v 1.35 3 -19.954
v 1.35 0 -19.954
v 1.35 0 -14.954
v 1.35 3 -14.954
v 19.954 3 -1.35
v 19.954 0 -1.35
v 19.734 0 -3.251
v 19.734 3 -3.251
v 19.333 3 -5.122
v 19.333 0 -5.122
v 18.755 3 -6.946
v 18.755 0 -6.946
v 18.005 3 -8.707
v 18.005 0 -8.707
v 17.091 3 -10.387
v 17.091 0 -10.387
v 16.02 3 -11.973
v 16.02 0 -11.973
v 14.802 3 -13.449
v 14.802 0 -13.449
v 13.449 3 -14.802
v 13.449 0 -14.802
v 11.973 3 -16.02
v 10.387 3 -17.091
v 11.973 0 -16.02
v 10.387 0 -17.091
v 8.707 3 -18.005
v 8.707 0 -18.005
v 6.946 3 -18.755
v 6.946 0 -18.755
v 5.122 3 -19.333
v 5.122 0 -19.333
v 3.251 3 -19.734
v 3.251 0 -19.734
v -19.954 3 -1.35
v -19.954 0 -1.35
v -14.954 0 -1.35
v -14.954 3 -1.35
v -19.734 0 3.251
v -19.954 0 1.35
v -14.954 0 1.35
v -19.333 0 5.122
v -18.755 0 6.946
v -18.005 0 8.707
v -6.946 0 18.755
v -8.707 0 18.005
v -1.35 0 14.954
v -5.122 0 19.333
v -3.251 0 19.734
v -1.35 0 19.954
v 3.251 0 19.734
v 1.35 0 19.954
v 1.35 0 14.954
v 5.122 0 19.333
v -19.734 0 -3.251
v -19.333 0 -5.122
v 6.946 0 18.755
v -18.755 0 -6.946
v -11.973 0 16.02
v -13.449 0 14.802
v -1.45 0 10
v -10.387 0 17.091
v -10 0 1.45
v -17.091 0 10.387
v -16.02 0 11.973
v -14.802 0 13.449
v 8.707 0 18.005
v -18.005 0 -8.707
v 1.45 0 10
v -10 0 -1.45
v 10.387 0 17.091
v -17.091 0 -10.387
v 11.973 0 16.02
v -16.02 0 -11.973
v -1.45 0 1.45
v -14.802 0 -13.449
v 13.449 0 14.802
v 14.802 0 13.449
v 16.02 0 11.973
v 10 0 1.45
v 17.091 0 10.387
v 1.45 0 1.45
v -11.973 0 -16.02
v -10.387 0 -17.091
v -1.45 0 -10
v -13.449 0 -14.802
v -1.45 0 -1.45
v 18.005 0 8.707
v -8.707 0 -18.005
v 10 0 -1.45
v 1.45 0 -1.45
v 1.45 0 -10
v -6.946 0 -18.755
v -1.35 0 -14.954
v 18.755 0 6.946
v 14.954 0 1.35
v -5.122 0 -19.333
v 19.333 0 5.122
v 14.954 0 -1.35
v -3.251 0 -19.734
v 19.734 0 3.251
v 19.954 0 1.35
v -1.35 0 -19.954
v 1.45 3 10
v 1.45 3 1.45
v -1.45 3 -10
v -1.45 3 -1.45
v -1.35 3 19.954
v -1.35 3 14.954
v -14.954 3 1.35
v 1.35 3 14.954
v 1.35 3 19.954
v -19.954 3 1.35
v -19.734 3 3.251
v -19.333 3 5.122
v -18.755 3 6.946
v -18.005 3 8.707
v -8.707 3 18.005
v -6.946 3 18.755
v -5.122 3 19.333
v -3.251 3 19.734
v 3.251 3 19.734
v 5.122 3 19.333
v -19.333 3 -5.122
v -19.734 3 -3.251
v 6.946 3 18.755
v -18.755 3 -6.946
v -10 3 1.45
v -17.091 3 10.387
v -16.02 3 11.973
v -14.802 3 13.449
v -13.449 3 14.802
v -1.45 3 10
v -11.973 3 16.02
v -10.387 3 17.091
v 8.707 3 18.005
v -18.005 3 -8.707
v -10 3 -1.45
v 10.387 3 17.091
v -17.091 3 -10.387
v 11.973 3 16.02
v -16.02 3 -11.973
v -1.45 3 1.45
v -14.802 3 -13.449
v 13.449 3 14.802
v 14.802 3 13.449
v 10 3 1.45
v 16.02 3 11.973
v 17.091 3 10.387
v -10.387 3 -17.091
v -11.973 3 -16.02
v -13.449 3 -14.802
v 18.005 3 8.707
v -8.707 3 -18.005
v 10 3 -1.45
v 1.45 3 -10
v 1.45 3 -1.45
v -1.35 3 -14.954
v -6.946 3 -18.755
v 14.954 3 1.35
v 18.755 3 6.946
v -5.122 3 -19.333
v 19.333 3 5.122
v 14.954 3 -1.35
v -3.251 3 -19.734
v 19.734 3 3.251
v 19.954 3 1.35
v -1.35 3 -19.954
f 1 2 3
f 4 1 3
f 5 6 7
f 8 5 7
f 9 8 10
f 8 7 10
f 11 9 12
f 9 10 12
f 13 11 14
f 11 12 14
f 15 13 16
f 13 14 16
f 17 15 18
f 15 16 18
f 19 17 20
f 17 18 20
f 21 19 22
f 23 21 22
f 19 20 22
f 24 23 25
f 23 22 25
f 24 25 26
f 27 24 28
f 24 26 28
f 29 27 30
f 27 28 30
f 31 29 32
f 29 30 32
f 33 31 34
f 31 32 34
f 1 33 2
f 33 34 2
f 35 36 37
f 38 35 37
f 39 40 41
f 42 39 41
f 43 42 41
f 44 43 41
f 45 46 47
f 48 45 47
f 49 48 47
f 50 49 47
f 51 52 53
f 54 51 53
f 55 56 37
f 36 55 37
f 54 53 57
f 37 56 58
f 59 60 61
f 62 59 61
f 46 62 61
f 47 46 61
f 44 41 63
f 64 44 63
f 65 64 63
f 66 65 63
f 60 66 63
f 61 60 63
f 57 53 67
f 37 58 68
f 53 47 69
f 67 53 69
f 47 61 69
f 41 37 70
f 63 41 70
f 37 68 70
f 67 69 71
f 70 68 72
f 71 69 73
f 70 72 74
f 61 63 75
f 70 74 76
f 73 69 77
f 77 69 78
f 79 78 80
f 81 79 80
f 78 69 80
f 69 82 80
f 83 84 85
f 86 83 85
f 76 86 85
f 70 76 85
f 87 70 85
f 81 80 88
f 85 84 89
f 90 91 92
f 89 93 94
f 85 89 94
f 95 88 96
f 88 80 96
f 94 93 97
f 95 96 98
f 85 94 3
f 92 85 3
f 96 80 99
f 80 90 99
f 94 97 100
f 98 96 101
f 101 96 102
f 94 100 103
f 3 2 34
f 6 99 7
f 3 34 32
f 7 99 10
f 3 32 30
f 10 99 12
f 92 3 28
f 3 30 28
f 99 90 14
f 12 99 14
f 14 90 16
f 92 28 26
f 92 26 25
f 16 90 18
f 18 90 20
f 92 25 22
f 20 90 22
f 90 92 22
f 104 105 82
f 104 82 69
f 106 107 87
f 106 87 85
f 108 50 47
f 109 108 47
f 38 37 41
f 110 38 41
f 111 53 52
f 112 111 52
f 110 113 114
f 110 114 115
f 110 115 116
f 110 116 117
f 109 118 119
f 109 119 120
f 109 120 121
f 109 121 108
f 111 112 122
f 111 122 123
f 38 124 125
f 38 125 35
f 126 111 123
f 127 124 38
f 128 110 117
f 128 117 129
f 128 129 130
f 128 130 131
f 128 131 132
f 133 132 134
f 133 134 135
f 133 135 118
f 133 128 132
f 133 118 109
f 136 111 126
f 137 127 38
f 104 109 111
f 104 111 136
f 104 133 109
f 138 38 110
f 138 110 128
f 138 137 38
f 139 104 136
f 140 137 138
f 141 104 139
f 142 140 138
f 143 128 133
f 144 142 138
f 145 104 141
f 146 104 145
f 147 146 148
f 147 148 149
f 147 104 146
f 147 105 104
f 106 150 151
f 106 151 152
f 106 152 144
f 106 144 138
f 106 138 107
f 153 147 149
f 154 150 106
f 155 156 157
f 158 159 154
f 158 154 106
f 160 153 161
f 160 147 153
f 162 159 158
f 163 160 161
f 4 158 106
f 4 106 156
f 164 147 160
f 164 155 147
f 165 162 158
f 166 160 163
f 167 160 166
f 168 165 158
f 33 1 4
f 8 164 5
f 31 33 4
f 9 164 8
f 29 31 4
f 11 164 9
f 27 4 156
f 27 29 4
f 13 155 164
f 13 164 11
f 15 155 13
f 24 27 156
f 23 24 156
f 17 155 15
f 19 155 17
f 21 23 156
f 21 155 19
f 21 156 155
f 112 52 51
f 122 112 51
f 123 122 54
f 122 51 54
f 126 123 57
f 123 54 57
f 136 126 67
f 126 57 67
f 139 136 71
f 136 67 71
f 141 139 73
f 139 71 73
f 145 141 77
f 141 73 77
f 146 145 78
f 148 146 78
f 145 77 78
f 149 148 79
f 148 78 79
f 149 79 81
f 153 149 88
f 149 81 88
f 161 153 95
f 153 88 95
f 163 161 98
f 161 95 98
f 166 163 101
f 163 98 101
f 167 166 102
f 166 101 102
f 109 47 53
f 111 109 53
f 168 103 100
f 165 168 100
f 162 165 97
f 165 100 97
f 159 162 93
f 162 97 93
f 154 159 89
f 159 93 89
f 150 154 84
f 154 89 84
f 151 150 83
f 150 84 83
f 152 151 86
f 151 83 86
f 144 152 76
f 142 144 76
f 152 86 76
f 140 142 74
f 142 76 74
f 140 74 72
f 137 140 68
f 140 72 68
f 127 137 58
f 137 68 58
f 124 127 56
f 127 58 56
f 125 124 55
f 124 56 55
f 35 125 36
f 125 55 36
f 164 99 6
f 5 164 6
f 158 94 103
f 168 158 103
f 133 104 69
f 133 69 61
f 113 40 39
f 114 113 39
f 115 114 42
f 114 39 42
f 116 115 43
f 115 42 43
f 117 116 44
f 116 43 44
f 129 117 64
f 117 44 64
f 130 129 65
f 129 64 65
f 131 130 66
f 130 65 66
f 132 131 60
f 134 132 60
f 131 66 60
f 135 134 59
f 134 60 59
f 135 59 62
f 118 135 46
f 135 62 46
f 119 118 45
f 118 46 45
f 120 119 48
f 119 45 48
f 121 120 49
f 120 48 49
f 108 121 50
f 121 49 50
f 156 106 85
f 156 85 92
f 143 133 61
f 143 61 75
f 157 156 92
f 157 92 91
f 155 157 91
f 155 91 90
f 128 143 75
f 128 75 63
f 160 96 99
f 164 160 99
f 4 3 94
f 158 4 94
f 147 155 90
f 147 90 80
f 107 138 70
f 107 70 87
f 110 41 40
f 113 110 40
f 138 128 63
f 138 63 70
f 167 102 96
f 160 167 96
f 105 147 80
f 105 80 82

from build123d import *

# Parameters (mm, degrees)
BOSS_EXTRUDE1_DEPTH = 3
CUT_EXTRUDE1_REACH  = 5


with BuildPart() as part:
    # Sketch1 → Boss-Extrude1 (new body)
    with BuildSketch(Plane(origin=(0, 0, 0), x_dir=(1, 0, 0), z_dir=(0, 1, 0))):
        with BuildLine():
            Line((1.35, 14.954385483), (-1.35, 14.954385483))
            Line((-1.35, 14.954385483), (-1.35, 19.954385483))
            ThreePointArc((-1.35, 19.954385483), (-14.142135624, 14.142135624), (-19.954385483, 1.35))
            Line((-19.954385483, 1.35), (-14.954385483, 1.35))
            Line((-14.954385483, 1.35), (-14.954385483, -1.35))
            Line((-14.954385483, -1.35), (-19.954385483, -1.35))
            ThreePointArc((-19.954385483, -1.35), (-14.142135624, -14.142135624), (-1.35, -19.954385483))
            Line((-1.35, -19.954385483), (-1.35, -14.954385483))
            Line((-1.35, -14.954385483), (1.35, -14.954385483))
            Line((1.35, -14.954385483), (1.35, -19.954385483))
            ThreePointArc((1.35, -19.954385483), (14.142135624, -14.142135624), (19.954385483, -1.35))
            Line((19.954385483, -1.35), (14.954385483, -1.35))
            Line((14.954385483, -1.35), (14.954385483, 1.35))
            Line((14.954385483, 1.35), (19.954385483, 1.35))
            ThreePointArc((19.954385483, 1.35), (14.142135624, 14.142135624), (1.35, 19.954385483))
            Line((1.35, 19.954385483), (1.35, 14.954385483))
        make_face()
    extrude(amount=BOSS_EXTRUDE1_DEPTH)

    # Sketch3 → Cut-Extrude1 (cut, up to next)
    with BuildSketch(Plane(origin=(0, 3, 0), x_dir=(1, 0, 0), z_dir=(0, 1, 0)), mode=Mode.PRIVATE) as cut_extrude1_sk1:
        Polygon((1.45, 1.45), (10, 1.45), (10, -1.45), (1.45, -1.45), (1.45, -10), (-1.45, -10), (-1.45, -1.45), (-10, -1.45), (-10, 1.45), (-1.45, 1.45), (-1.45, 10), (1.45, 10), align=None)
    cut_extrude1_tool1 = extrude(cut_extrude1_sk1.sketch, amount=-CUT_EXTRUDE1_REACH, mode=Mode.PRIVATE) & part.part
    add(cut_extrude1_tool1.solids().sort_by_distance((0, 3, 0))[0], mode=Mode.SUBTRACT)


solid = part.part
